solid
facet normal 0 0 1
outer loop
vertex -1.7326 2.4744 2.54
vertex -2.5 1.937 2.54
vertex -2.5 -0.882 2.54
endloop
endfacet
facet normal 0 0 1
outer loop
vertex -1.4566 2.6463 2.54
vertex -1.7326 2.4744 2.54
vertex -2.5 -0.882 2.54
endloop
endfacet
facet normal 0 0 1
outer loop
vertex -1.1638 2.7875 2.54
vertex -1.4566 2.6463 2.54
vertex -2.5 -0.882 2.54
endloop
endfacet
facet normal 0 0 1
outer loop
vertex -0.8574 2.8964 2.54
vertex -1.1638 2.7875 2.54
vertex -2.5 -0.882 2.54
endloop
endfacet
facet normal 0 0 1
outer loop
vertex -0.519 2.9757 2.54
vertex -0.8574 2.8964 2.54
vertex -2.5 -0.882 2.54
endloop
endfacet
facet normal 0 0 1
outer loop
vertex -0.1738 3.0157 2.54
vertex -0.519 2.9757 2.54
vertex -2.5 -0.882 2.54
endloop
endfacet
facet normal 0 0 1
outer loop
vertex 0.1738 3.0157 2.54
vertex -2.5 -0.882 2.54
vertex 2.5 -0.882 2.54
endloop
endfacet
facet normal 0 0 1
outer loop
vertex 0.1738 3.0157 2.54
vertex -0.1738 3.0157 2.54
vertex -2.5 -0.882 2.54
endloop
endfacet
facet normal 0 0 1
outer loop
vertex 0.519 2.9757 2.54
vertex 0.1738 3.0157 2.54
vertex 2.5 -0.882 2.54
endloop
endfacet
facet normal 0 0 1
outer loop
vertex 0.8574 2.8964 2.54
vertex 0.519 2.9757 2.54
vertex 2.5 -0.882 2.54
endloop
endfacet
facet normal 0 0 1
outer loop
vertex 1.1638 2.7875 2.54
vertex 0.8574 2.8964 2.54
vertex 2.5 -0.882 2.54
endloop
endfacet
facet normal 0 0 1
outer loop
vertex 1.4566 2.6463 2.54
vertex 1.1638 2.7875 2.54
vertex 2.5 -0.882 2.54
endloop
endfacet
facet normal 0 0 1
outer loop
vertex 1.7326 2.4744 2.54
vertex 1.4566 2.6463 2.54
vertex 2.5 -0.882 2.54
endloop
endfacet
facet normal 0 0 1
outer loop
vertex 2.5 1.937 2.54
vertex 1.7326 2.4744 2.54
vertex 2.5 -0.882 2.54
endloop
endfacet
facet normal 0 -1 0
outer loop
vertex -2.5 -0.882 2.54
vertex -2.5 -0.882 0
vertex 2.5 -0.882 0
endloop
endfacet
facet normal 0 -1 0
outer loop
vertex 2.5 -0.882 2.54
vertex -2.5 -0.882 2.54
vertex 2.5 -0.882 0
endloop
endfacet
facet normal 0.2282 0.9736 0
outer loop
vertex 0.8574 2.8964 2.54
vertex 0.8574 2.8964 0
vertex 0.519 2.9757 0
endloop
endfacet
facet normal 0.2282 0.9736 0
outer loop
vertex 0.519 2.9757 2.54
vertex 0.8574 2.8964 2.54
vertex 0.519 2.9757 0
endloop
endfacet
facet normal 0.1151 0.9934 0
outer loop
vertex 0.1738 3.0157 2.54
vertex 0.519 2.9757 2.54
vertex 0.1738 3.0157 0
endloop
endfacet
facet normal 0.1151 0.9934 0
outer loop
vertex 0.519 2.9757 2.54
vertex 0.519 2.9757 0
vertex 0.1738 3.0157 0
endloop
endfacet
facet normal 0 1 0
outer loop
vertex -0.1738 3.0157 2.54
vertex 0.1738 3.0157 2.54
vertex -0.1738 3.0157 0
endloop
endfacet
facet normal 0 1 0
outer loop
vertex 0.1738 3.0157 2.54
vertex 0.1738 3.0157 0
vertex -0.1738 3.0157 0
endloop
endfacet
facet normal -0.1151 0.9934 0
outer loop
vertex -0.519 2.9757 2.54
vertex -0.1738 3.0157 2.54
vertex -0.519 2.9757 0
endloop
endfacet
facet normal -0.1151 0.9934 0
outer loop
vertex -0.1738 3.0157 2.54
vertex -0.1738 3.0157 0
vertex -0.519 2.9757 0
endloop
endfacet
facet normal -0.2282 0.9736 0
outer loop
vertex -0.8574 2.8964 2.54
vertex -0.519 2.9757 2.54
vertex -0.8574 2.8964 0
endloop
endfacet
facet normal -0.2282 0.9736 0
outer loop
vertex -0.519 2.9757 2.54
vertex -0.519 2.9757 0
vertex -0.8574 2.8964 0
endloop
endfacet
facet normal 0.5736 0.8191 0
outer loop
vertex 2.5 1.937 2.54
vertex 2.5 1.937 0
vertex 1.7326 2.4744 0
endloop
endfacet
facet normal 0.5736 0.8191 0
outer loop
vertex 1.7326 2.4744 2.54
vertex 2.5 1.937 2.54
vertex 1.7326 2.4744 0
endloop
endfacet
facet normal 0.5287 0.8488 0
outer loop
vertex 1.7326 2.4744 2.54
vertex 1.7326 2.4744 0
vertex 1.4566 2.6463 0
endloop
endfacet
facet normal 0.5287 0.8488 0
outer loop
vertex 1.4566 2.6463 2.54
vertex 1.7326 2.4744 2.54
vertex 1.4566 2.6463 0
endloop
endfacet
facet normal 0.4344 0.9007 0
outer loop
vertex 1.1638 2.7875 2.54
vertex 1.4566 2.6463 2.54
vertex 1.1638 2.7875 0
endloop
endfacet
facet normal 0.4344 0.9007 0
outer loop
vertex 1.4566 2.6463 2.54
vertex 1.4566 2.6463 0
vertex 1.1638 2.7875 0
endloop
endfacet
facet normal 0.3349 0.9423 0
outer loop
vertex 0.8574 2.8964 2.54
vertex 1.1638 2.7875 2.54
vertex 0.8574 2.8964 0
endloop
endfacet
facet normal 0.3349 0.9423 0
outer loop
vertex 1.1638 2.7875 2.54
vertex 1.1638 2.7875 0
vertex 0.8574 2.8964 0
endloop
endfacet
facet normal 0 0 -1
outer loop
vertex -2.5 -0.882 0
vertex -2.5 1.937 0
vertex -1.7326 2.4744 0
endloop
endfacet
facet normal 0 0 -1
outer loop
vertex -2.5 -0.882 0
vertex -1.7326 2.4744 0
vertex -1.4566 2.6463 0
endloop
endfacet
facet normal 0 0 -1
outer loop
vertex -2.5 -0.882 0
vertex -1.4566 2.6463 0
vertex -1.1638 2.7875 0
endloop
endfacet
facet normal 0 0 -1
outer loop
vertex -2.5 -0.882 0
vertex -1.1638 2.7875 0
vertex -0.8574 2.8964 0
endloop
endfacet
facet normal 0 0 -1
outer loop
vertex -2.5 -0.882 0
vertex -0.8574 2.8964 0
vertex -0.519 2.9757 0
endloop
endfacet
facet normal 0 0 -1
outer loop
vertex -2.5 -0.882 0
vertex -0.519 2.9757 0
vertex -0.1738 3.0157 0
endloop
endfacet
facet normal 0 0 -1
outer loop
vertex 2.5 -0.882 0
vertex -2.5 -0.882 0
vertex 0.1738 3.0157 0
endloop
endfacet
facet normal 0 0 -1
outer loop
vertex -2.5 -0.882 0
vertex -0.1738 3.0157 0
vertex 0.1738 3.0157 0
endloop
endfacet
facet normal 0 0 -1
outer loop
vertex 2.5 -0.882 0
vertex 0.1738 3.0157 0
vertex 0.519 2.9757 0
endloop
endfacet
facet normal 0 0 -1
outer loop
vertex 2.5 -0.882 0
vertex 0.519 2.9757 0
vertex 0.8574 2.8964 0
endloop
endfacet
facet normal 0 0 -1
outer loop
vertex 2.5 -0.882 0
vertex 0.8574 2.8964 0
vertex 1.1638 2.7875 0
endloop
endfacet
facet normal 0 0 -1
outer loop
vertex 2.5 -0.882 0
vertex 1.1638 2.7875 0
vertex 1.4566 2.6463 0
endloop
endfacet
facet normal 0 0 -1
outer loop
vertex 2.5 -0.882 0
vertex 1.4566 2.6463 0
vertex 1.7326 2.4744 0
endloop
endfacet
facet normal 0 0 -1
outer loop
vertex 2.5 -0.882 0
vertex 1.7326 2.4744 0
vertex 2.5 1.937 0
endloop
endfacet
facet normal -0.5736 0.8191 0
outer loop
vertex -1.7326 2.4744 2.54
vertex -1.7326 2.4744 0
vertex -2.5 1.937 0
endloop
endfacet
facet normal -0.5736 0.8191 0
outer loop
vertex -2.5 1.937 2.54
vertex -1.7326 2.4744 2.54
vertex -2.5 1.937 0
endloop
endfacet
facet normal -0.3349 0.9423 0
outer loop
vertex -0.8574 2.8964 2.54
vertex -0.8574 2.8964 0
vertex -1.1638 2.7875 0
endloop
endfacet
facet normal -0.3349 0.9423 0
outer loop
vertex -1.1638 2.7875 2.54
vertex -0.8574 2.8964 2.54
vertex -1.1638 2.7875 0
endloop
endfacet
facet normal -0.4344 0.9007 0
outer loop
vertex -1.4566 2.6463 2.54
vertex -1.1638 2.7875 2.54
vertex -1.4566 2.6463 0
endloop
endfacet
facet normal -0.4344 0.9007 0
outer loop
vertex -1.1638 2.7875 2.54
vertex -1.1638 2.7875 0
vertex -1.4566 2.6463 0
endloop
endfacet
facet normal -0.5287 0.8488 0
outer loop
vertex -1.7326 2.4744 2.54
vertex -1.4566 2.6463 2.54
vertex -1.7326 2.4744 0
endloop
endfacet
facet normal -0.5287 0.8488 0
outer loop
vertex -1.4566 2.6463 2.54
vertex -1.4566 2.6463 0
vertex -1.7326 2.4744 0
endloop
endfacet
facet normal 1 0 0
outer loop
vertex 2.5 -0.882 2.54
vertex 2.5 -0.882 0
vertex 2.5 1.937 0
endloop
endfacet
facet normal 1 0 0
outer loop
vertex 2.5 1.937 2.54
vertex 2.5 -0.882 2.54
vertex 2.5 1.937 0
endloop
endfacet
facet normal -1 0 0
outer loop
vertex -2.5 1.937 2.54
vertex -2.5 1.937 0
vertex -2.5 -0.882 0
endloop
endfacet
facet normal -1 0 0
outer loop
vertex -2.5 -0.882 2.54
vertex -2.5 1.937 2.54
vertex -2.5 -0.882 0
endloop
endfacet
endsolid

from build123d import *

# Parameters (mm, degrees)
BOSS_EXTRUDE1_DEPTH = 2.54


with BuildPart() as part:
    # Sketch1 → Boss-Extrude1 (new body)
    with BuildSketch(Plane.XY):
        with BuildLine():
            Line((-2.5, -0.88204324), (2.5, -0.88204324))
            Line((2.5, -0.88204324), (2.5, 1.937019723))
            Line((2.5, 1.937019723), (1.732576391, 2.474375519))
            ThreePointArc((1.732576391, 2.474375519), (1.312078864, 2.720809477), (0.857422044, 2.896408569))
            ThreePointArc((0.857422044, 2.896408569), (0, 3.020654757), (-0.857422044, 2.896408569))
            ThreePointArc((-0.857422044, 2.896408569), (-1.312078864, 2.720809477), (-1.732576391, 2.474375519))
            Line((-1.732576391, 2.474375519), (-2.5, 1.937019723))
            Line((-2.5, 1.937019723), (-2.5, -0.88204324))
        make_face()
    extrude(amount=BOSS_EXTRUDE1_DEPTH)


solid = part.part
